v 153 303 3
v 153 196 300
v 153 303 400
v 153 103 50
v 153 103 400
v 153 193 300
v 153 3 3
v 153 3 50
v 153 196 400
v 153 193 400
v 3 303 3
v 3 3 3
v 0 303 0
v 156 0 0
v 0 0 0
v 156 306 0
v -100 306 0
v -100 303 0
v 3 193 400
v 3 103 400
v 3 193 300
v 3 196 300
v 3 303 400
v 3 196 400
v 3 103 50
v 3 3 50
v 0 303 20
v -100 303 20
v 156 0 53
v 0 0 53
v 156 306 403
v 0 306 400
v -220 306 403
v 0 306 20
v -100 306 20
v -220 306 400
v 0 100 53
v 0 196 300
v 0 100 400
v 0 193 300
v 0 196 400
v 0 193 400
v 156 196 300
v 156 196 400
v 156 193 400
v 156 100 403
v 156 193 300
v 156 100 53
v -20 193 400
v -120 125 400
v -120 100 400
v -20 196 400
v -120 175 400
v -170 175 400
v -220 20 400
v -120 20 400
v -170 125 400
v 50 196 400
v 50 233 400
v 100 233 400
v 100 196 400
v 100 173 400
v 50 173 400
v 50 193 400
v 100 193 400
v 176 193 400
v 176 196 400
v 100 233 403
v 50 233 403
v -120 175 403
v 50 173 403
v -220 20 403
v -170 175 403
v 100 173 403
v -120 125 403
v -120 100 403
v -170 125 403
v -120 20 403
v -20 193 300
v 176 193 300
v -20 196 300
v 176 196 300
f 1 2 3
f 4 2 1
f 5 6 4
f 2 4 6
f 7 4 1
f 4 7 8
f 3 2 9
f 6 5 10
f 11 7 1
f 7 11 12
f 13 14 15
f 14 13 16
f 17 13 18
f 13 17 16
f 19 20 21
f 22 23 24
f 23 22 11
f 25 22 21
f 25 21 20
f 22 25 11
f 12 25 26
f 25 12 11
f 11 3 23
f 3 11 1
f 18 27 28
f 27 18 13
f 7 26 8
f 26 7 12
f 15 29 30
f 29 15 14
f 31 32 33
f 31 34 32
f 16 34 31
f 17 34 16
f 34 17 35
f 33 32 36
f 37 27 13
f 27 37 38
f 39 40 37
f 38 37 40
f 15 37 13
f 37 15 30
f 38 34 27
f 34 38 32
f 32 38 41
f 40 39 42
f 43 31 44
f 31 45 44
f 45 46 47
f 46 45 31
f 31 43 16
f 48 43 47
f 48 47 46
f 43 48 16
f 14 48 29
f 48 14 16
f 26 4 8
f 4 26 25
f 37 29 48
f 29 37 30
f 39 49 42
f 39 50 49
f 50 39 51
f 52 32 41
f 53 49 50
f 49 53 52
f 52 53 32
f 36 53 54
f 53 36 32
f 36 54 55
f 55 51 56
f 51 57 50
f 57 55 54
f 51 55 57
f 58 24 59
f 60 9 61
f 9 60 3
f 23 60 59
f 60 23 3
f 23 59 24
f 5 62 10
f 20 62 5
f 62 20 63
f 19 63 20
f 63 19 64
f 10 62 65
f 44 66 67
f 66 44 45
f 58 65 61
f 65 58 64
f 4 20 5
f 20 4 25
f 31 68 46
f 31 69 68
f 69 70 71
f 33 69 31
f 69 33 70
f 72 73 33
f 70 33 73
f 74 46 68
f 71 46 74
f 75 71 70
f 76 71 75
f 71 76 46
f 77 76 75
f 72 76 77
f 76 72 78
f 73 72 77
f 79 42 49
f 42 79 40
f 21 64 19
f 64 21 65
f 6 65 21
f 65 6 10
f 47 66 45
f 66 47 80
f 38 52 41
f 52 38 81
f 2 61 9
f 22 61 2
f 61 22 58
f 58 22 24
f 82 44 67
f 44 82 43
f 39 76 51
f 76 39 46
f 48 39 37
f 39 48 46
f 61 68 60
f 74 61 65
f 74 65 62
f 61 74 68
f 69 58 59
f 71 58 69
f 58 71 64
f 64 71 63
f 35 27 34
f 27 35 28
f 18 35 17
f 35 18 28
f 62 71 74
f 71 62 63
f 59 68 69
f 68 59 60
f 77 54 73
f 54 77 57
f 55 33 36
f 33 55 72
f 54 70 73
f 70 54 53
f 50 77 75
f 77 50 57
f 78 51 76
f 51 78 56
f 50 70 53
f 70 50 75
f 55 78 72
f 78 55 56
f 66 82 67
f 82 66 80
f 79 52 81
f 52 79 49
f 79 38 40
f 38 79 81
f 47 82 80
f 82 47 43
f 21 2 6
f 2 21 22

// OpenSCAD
// file: part08.scad
module part08(){
    translate([-20,193,350])color("green")cube([196,3,50]);
    translate([-20,193,300])color("green")cube([20,3,50]);
    translate([156,193,300])color("green")cube([20,3,50]);
    translate([3,193,300])color("green")cube([150,3,50]);

}


//use <part01.scad>;
//use <part02.scad>;
//use <part03.scad>;
//use <part04.scad>;
//use <part05.scad>;
//use <part06.scad>;
//use <part07.scad>;
//
//part01();
//part02();
//part03();
//// zweites Seitenteil
//translate([15.3,0,0]) part03();
//part04();
//part05();
//part06();
//part07();
part08();
//
//projection (cut=false)
//translate([0,0,0])rotate([-90,0,0]) part08();
// file: part07.scad
module part07(){
    
    // stripe right
    translate([100,100,400]) color("green") cube([53,206,3]);
    
    //hole in the middle 
    translate([50,103,400]) color("green") cube([50,70,3]);
    translate([50,233,400]) color("green") cube([50,70,3]);
    
    // column left stripe
    translate([3,100,400]) color("green") cube([47,206,3]);
    
    
    // connectors
    
    // mitte hinten
    translate([0,263,400]) color("green") cube([3,43,3]);
    // mitte mitte
    translate([0,163,400]) color("green") cube([3,70,3]);
    translate([0,100,400]) color("green") cube([3,33,3]);
    
    // rechts vorne
    translate([153,100,400]) color("green") cube([3,33,3]);
    
    // rechts mitte
    translate([153,163,400]) color("green") cube([3,70,3]);
    
    // rechts hinten
    translate([153,263,400]) color("green") cube([3,43,3]);
    
    
    // arm right stripe
    translate([-50,100,400]) color("green") cube([50,206,3]);
    
    translate([-220,125,400]) color("green") cube([50,50,3]);
    translate([-120,100,400]) color("green") cube([70,206,3]);
    
    // ueberhang vorne
    translate([-220,20,400]) color("green") cube([100,105,3]);
    // hinten links
    translate([-220,175,400]) color("green") cube([100,131,3]);
}

//use <part01.scad>;
//use <part02.scad>;
//use <part03.scad>;
//use <part04.scad>;
//use <part05.scad>;
//use <part06.scad>;
//part01();
//part02();
//part03();
//// zweites Seitenteil
//translate([15.3,0,0]) part03();
//part04();
//part05();
//part06();
part07();
// file: part06.scad
module part06(){
translate([3,303,3]) color("pink") cube([150,3,397]);
translate([0,303,0]) color("pink") cube([23,3,60]);
translate([133,303,0]) color("pink") cube([23,3,60]);
translate([53,303,0]) color("pink") cube([50,3,3]);
    translate([0,303,120]) color("pink") cube([3,3,120]);
    translate([153,303,120]) color("pink") cube([3,3,120]);
    translate([0,303,300]) color("pink") cube([3,3,100]);
    
    // connector top
    translate([50,303,400]) color("pink") cube([50,3,3]);
    // corresponding element on part05
    //translate([5,10,40]) color("pink") cube([5,0.3,0.3]);
    
    
    // stabilisation
    translate([-100,303,0]) color("pink") cube([100,3,20]);
    
    // connectors right
    translate([153,303,300]) color("pink") cube([3,3,100]);
}

part06();
// file: part05.scad
module part05(){
    translate([3,100,53])color("grey") cube([150,3,347]);
    translate([0,100,53])color("grey") cube([3,3,67]);
    translate([153,100,53])color("gray") cube([3,3,67]);
    translate([0,100,180])color("grey") cube([3,3,80]);
    translate([153,100,180])color("grey") cube([3,3,80]);
    
    // connector top
    translate([50,100,400]) color("grey") cube([50,3,3]);
    // corresponding element on part06
    //translate([5,30.3,40]) color("red") cube([5,0.3,0.3]);
    
    // connectors left
    translate([0,100,320])color("grey") cube([3,3,80]);
    
    // connectors right
    translate([153,100,320])color("grey") cube([3,3,80]);
}

//use <part01.scad>;
//use <part02.scad>;
//use <part03.scad>;
//use <part04.scad>;

//part01();
//part02();
//part03();
//// zweites Seitenteil
//translate([15.3,0,0]) part03();
//part04();
part05();
// file: part04.scad
module part04 (){
    translate([3,3,50])color("blue") cube([150,100,3]);
    translate([0,0,50])color("blue") cube([23,13,3]);
    translate([133,0,50])color("blue") cube([23,13,3]);
    translate([53,0,50])color("blue") cube([50,3,3]);
    translate([0,33,50])color("blue") cube([3,27,3]);
    translate([153,33,50])color("blue") cube([3,27,3]);
    translate([0,80,50])color("blue") cube([3,23,3]);
    translate([153,80,50])color("blue") cube([3,23,3]);
}

//use <part01.scad>;
//use <part02.scad>;
//use <part03.scad>;
//
//part01();
//part02();
//part03();
//// zweites Seitenteil
//translate([15.3,0,0]) part03();

part04();
// file: part03a.scad
module part03a (){
    
    // base form
    translate([0,3,3] )color ("orange") cube([3,97,47]);
    
    // pin unten vorne
    translate([0,3,0]) color ("orange") cube([3,30,3]);
    
    // pin vorderseite
    translate([0,0,15]) color ("orange") cube([3,3,15]);
   
    
    // pin oben vorne
    translate([0,13,50]) color ("orange") cube([3,20,3]);
    
    //pin unten hinten
    translate([0,63,0] )color ("orange") cube([3,37,3]);
    
    
    // pin oben hinten
    translate([0,60,50])color ("orange") cube([3,20,3]);
    
    // connector part03 unten
    translate([0,100,0]) color ("orange") cube([3,3,20]);
    
    // connector part03 oben
    translate([0,100,40]) color ("orange") cube([3,3,10]);
}

part03a();
// file: part03.scad
module part03 (){
    // high part
    translate([0,103,0]) color ("red") cube([3,30,400]);
    translate([0,133,3]) color ("red") cube([3,30,400]);
    // middle part
    translate([0,163,0])color("red") cube([3,30,400]);
    //einkerbung
    translate([0,193,0])color("red") cube([3,3,350]);
    translate([0,196,0])color("red") cube([3,40,400]);
    translate([0,233,3])color("red") cube([3,30,400]);
    translate([0,263,0]) color("red") cube([3,40,400]);
    translate([0,303,60])color("red")cube([3,3,60]);
    translate([0,303,240])color("red")cube([3,3,60]);
    translate([0,100,120])color("red")cube([3,3,60]);
    translate([0,100,260])color("red")cube([3,3,60]);
    
    // pin part03a
    translate([0,100,20]) color ("blue") cube([3,3,20]);
}

// to long for printer
part03();
// file: part02.scad
module part02 (){
    //links
    color("green") cube([23,3,15]);
    translate([3,0,15])color("green")  cube([20,3,15]);
    translate([0,0,30]) color("green") cube([23,3,20]);
    // high links
    translate([23,0,3]) color("green") cube([30,3,50]);
    // mitte
    translate([53,0,0]) color("green") cube([50,3,50]);
    // high rechts
    translate([103,0,3])color("green")  cube([30,3,50]);
    // rechts
    translate([133,0,0])
    color("green") cube([23,3,15]);
    translate([133,0,15]) color("green") cube([20,3,15]);
    translate([133,0,30]) color("green") cube([23,3,20]);
}
part02();
// file: part01.scad
module part01 (){
//part 1
translate([3,3,0]) cube([150,300,3]);
// front handles
translate([23,0,0])cube([30,3,3]);
translate([103,0,0])cube([30,3,3]);
// back handles
translate([23,303,0])cube([30,3,3]);
translate([103,303,0])cube([30,3,3]);
// left handles
translate([0,33,0]) cube([3,30,3]);
translate([0,133,0]) cube([3,30,3]);
translate([0,233,0]) cube([3,30,3]);
// right handles
translate([153,33,0]) cube([3,30,3]);
translate([153,133,0]) cube([3,30,3]);
translate([153,233,0]) cube([3,30,3]);
};
part01();
// main file
use <part01.scad>;
use <part02.scad>;
use <part03.scad>;
use <part03a.scad>;
use <part04.scad>;
use <part05.scad>;
use <part06.scad>;
use <part07.scad>;
use <part08.scad>;

part01();
part02();
part03();
// zweites Seitenteil
translate([153,0,0]) part03();

part03a();
// zweites Seitenteil
translate([153,0,0]) part03a();
part04();
part05();
part06();
part07();
part08();
